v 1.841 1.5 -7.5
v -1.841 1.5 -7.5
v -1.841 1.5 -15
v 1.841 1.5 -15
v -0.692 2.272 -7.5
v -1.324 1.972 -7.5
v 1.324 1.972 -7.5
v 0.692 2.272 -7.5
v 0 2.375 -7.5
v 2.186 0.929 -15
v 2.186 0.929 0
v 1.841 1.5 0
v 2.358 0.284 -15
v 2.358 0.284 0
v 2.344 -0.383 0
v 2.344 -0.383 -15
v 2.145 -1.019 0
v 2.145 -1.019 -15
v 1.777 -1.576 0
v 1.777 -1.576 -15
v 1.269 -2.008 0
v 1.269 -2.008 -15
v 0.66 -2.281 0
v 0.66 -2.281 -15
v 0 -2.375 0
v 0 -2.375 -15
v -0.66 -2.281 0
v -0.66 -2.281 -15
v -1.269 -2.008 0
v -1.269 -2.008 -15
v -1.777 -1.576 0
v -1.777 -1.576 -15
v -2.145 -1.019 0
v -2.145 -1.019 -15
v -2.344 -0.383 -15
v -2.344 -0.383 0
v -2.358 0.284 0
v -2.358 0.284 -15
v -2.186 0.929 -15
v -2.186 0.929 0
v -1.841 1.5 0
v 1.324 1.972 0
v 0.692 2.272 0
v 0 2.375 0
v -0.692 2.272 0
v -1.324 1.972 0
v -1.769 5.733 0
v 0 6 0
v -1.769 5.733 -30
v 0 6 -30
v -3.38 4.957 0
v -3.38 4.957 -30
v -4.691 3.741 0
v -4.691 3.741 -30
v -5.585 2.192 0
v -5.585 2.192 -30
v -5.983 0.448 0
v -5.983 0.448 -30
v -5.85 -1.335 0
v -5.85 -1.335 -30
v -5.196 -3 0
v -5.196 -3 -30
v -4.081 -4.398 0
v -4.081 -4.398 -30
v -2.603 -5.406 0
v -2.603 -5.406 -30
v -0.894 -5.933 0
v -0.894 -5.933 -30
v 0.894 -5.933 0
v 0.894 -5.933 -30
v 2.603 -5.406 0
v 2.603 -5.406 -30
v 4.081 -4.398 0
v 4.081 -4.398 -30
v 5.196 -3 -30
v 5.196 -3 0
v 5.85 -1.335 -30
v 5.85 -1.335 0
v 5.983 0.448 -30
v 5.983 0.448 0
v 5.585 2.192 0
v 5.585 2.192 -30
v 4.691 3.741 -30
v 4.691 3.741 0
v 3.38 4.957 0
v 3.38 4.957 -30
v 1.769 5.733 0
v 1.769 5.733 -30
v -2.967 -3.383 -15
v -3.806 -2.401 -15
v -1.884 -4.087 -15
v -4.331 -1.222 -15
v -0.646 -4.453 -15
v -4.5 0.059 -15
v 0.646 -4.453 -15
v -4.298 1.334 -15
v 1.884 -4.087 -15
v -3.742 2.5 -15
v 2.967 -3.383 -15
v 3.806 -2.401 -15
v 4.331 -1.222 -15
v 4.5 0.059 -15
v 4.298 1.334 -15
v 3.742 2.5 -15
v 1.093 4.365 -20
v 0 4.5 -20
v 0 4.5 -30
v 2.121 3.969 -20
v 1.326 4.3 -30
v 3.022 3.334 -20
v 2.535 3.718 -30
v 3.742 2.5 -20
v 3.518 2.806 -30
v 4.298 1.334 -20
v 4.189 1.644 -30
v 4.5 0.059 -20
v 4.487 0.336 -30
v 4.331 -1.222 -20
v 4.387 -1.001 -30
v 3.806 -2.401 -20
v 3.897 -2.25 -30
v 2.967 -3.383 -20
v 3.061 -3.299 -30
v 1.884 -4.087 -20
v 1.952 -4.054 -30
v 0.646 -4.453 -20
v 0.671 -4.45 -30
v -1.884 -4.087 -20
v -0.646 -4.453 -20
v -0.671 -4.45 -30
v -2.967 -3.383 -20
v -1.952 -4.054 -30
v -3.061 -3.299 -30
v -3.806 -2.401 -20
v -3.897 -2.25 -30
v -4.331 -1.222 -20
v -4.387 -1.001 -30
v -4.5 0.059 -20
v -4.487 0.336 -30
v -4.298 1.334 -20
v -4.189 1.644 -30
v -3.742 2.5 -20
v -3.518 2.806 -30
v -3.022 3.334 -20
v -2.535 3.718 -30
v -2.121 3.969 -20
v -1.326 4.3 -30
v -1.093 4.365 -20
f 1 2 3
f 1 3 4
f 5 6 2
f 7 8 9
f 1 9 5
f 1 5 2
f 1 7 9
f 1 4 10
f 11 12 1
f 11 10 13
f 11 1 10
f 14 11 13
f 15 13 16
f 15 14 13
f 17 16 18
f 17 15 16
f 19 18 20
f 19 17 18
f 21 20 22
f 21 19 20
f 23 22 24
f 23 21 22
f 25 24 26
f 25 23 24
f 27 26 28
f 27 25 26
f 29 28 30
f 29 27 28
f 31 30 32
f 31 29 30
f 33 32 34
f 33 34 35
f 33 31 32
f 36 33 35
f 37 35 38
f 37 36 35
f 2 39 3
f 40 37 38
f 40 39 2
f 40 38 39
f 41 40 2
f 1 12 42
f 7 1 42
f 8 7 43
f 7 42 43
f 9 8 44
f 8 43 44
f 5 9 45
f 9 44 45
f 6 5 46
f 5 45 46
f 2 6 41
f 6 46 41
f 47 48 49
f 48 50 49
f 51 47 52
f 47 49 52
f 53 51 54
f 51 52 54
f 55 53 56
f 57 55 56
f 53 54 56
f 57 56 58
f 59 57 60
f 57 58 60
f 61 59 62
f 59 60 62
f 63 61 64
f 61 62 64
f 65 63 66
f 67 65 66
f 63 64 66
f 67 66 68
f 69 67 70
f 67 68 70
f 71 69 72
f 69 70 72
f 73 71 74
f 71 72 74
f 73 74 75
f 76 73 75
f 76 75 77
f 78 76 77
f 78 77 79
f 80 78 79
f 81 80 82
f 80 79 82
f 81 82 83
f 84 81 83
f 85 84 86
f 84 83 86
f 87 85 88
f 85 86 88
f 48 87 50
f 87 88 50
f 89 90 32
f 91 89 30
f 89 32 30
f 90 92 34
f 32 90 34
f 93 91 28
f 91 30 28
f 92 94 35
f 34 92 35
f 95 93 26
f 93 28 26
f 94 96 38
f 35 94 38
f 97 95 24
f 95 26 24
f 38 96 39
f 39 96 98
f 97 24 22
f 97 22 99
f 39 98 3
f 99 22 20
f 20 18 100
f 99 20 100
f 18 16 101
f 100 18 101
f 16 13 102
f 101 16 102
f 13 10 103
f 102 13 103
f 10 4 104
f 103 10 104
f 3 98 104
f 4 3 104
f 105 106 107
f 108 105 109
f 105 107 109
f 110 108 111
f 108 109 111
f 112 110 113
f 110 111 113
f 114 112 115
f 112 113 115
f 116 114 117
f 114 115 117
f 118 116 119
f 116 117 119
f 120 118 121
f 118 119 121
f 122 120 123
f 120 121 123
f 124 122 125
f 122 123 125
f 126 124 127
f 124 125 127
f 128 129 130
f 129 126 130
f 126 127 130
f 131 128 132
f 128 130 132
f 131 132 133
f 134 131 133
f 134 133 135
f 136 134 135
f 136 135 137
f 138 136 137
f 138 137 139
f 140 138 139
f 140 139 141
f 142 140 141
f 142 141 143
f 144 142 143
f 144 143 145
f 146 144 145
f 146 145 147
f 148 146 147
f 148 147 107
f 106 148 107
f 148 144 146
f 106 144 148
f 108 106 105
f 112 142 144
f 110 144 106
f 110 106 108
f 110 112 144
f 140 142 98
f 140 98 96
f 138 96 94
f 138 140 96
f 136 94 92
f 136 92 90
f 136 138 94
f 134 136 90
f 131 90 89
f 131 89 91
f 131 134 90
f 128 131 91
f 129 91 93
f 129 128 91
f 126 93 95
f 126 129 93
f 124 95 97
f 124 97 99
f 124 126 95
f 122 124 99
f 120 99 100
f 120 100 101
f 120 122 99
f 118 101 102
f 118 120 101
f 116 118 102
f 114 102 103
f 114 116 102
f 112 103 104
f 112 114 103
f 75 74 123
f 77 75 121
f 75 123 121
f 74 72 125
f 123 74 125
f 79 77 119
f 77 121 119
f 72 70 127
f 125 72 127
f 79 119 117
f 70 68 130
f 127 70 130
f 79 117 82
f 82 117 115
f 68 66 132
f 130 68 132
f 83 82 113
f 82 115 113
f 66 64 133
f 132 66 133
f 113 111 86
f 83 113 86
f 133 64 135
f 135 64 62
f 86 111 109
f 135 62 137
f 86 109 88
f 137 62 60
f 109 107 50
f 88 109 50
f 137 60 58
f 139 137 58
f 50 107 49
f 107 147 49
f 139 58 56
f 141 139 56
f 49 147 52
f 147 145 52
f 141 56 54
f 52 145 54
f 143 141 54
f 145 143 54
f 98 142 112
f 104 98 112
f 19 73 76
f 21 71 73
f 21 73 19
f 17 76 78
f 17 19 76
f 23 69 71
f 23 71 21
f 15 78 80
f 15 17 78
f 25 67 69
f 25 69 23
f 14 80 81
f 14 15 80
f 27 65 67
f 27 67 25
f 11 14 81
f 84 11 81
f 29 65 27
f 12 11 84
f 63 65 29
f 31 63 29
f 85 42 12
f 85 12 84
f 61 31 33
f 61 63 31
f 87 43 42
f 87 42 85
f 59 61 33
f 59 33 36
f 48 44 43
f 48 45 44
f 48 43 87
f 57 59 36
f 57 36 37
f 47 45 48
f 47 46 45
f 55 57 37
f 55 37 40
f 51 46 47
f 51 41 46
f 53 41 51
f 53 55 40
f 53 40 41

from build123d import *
from build123d.topology import SkipClean

# Parameters (mm, degrees)
ESQUISSE1_W             = 30
ESQUISSE1_H             = 6
ENL_V_MAT_EXTRU_4_DEPTH = 7.5
ENL_V_MAT_EXTRU_5_DEPTH = 15
ESQUISSE3_R             = 4.5
ENL_V_MAT_EXTRU_6_DEPTH = 10
ENL_V_MAT_EXTRU_9_DEPTH = 5


with BuildPart() as part:
    # Esquisse1 → Révolution1 (revolve)
    with BuildSketch(Plane(origin=(0, 0, 0), x_dir=(0, 0, -1), z_dir=(1, 0, 0)), mode=Mode.PRIVATE) as r_volution1_sk:
        with Locations((15, -3)):
            Rectangle(ESQUISSE1_W, ESQUISSE1_H)
    revolve(r_volution1_sk.sketch.rotate(Axis((0, 0, -30), (0, 0, 1)), 180), axis=Axis((0, 0, -30), (0, 0, 1)))

    # Esquisse2 → Enlèv. mat.-Extru.4 (cut)
    with BuildSketch(Plane.XY):
        with BuildLine():
            Line((-1.841364983, 1.5), (0, 1.5))
            Line((0, 1.5), (1.841364983, 1.5))
            ThreePointArc((1.841364983, 1.5), (0, 2.375), (-1.841364983, 1.5))
        make_face()
    extrude(amount=-ENL_V_MAT_EXTRU_4_DEPTH, mode=Mode.SUBTRACT)

    # Esquisse5 → Enlèv. mat.-Extru.5 (cut)
    with SkipClean():  # the faces are left unmerged after this step: merging them gives an invalid solid
        with BuildSketch(Plane.XY):
            with BuildLine():
                Line((-1.841364983, 1.5), (1.841364983, 1.5))
                ThreePointArc((1.841364983, 1.5), (0, -2.375), (-1.841364983, 1.5))
            make_face()
        extrude(amount=-ENL_V_MAT_EXTRU_5_DEPTH, mode=Mode.SUBTRACT)

    # Esquisse3 → Enlèv. mat.-Extru.6 (cut)
    with SkipClean():  # the faces are left unmerged after this step: merging them gives an invalid solid
        with BuildSketch(Plane(origin=(0, 0, -30), x_dir=(-1, 0, 0), z_dir=(0, 0, -1))):
            with Locations(Location((0, 0, 0), (0, 0, 90))):
                Circle(ESQUISSE3_R)
        extrude(amount=-ENL_V_MAT_EXTRU_6_DEPTH, mode=Mode.SUBTRACT)

    # Esquisse7 → Enlèv. mat.-Extru.9 (cut)
    with SkipClean():  # the faces are left unmerged after this step: merging them gives an invalid solid
        with BuildSketch(Plane(origin=(0, 0, -20), x_dir=(-1, 0, 0), z_dir=(0, 0, -1))):
            with BuildLine():
                Line((0, 2.5), (3.741657387, 2.5))
                ThreePointArc((3.741657387, 2.5), (0, -4.5), (-3.741657387, 2.5))
                Line((-3.741657387, 2.5), (0, 2.5))
            make_face()
        extrude(amount=-ENL_V_MAT_EXTRU_9_DEPTH, mode=Mode.SUBTRACT)


solid = part.part
